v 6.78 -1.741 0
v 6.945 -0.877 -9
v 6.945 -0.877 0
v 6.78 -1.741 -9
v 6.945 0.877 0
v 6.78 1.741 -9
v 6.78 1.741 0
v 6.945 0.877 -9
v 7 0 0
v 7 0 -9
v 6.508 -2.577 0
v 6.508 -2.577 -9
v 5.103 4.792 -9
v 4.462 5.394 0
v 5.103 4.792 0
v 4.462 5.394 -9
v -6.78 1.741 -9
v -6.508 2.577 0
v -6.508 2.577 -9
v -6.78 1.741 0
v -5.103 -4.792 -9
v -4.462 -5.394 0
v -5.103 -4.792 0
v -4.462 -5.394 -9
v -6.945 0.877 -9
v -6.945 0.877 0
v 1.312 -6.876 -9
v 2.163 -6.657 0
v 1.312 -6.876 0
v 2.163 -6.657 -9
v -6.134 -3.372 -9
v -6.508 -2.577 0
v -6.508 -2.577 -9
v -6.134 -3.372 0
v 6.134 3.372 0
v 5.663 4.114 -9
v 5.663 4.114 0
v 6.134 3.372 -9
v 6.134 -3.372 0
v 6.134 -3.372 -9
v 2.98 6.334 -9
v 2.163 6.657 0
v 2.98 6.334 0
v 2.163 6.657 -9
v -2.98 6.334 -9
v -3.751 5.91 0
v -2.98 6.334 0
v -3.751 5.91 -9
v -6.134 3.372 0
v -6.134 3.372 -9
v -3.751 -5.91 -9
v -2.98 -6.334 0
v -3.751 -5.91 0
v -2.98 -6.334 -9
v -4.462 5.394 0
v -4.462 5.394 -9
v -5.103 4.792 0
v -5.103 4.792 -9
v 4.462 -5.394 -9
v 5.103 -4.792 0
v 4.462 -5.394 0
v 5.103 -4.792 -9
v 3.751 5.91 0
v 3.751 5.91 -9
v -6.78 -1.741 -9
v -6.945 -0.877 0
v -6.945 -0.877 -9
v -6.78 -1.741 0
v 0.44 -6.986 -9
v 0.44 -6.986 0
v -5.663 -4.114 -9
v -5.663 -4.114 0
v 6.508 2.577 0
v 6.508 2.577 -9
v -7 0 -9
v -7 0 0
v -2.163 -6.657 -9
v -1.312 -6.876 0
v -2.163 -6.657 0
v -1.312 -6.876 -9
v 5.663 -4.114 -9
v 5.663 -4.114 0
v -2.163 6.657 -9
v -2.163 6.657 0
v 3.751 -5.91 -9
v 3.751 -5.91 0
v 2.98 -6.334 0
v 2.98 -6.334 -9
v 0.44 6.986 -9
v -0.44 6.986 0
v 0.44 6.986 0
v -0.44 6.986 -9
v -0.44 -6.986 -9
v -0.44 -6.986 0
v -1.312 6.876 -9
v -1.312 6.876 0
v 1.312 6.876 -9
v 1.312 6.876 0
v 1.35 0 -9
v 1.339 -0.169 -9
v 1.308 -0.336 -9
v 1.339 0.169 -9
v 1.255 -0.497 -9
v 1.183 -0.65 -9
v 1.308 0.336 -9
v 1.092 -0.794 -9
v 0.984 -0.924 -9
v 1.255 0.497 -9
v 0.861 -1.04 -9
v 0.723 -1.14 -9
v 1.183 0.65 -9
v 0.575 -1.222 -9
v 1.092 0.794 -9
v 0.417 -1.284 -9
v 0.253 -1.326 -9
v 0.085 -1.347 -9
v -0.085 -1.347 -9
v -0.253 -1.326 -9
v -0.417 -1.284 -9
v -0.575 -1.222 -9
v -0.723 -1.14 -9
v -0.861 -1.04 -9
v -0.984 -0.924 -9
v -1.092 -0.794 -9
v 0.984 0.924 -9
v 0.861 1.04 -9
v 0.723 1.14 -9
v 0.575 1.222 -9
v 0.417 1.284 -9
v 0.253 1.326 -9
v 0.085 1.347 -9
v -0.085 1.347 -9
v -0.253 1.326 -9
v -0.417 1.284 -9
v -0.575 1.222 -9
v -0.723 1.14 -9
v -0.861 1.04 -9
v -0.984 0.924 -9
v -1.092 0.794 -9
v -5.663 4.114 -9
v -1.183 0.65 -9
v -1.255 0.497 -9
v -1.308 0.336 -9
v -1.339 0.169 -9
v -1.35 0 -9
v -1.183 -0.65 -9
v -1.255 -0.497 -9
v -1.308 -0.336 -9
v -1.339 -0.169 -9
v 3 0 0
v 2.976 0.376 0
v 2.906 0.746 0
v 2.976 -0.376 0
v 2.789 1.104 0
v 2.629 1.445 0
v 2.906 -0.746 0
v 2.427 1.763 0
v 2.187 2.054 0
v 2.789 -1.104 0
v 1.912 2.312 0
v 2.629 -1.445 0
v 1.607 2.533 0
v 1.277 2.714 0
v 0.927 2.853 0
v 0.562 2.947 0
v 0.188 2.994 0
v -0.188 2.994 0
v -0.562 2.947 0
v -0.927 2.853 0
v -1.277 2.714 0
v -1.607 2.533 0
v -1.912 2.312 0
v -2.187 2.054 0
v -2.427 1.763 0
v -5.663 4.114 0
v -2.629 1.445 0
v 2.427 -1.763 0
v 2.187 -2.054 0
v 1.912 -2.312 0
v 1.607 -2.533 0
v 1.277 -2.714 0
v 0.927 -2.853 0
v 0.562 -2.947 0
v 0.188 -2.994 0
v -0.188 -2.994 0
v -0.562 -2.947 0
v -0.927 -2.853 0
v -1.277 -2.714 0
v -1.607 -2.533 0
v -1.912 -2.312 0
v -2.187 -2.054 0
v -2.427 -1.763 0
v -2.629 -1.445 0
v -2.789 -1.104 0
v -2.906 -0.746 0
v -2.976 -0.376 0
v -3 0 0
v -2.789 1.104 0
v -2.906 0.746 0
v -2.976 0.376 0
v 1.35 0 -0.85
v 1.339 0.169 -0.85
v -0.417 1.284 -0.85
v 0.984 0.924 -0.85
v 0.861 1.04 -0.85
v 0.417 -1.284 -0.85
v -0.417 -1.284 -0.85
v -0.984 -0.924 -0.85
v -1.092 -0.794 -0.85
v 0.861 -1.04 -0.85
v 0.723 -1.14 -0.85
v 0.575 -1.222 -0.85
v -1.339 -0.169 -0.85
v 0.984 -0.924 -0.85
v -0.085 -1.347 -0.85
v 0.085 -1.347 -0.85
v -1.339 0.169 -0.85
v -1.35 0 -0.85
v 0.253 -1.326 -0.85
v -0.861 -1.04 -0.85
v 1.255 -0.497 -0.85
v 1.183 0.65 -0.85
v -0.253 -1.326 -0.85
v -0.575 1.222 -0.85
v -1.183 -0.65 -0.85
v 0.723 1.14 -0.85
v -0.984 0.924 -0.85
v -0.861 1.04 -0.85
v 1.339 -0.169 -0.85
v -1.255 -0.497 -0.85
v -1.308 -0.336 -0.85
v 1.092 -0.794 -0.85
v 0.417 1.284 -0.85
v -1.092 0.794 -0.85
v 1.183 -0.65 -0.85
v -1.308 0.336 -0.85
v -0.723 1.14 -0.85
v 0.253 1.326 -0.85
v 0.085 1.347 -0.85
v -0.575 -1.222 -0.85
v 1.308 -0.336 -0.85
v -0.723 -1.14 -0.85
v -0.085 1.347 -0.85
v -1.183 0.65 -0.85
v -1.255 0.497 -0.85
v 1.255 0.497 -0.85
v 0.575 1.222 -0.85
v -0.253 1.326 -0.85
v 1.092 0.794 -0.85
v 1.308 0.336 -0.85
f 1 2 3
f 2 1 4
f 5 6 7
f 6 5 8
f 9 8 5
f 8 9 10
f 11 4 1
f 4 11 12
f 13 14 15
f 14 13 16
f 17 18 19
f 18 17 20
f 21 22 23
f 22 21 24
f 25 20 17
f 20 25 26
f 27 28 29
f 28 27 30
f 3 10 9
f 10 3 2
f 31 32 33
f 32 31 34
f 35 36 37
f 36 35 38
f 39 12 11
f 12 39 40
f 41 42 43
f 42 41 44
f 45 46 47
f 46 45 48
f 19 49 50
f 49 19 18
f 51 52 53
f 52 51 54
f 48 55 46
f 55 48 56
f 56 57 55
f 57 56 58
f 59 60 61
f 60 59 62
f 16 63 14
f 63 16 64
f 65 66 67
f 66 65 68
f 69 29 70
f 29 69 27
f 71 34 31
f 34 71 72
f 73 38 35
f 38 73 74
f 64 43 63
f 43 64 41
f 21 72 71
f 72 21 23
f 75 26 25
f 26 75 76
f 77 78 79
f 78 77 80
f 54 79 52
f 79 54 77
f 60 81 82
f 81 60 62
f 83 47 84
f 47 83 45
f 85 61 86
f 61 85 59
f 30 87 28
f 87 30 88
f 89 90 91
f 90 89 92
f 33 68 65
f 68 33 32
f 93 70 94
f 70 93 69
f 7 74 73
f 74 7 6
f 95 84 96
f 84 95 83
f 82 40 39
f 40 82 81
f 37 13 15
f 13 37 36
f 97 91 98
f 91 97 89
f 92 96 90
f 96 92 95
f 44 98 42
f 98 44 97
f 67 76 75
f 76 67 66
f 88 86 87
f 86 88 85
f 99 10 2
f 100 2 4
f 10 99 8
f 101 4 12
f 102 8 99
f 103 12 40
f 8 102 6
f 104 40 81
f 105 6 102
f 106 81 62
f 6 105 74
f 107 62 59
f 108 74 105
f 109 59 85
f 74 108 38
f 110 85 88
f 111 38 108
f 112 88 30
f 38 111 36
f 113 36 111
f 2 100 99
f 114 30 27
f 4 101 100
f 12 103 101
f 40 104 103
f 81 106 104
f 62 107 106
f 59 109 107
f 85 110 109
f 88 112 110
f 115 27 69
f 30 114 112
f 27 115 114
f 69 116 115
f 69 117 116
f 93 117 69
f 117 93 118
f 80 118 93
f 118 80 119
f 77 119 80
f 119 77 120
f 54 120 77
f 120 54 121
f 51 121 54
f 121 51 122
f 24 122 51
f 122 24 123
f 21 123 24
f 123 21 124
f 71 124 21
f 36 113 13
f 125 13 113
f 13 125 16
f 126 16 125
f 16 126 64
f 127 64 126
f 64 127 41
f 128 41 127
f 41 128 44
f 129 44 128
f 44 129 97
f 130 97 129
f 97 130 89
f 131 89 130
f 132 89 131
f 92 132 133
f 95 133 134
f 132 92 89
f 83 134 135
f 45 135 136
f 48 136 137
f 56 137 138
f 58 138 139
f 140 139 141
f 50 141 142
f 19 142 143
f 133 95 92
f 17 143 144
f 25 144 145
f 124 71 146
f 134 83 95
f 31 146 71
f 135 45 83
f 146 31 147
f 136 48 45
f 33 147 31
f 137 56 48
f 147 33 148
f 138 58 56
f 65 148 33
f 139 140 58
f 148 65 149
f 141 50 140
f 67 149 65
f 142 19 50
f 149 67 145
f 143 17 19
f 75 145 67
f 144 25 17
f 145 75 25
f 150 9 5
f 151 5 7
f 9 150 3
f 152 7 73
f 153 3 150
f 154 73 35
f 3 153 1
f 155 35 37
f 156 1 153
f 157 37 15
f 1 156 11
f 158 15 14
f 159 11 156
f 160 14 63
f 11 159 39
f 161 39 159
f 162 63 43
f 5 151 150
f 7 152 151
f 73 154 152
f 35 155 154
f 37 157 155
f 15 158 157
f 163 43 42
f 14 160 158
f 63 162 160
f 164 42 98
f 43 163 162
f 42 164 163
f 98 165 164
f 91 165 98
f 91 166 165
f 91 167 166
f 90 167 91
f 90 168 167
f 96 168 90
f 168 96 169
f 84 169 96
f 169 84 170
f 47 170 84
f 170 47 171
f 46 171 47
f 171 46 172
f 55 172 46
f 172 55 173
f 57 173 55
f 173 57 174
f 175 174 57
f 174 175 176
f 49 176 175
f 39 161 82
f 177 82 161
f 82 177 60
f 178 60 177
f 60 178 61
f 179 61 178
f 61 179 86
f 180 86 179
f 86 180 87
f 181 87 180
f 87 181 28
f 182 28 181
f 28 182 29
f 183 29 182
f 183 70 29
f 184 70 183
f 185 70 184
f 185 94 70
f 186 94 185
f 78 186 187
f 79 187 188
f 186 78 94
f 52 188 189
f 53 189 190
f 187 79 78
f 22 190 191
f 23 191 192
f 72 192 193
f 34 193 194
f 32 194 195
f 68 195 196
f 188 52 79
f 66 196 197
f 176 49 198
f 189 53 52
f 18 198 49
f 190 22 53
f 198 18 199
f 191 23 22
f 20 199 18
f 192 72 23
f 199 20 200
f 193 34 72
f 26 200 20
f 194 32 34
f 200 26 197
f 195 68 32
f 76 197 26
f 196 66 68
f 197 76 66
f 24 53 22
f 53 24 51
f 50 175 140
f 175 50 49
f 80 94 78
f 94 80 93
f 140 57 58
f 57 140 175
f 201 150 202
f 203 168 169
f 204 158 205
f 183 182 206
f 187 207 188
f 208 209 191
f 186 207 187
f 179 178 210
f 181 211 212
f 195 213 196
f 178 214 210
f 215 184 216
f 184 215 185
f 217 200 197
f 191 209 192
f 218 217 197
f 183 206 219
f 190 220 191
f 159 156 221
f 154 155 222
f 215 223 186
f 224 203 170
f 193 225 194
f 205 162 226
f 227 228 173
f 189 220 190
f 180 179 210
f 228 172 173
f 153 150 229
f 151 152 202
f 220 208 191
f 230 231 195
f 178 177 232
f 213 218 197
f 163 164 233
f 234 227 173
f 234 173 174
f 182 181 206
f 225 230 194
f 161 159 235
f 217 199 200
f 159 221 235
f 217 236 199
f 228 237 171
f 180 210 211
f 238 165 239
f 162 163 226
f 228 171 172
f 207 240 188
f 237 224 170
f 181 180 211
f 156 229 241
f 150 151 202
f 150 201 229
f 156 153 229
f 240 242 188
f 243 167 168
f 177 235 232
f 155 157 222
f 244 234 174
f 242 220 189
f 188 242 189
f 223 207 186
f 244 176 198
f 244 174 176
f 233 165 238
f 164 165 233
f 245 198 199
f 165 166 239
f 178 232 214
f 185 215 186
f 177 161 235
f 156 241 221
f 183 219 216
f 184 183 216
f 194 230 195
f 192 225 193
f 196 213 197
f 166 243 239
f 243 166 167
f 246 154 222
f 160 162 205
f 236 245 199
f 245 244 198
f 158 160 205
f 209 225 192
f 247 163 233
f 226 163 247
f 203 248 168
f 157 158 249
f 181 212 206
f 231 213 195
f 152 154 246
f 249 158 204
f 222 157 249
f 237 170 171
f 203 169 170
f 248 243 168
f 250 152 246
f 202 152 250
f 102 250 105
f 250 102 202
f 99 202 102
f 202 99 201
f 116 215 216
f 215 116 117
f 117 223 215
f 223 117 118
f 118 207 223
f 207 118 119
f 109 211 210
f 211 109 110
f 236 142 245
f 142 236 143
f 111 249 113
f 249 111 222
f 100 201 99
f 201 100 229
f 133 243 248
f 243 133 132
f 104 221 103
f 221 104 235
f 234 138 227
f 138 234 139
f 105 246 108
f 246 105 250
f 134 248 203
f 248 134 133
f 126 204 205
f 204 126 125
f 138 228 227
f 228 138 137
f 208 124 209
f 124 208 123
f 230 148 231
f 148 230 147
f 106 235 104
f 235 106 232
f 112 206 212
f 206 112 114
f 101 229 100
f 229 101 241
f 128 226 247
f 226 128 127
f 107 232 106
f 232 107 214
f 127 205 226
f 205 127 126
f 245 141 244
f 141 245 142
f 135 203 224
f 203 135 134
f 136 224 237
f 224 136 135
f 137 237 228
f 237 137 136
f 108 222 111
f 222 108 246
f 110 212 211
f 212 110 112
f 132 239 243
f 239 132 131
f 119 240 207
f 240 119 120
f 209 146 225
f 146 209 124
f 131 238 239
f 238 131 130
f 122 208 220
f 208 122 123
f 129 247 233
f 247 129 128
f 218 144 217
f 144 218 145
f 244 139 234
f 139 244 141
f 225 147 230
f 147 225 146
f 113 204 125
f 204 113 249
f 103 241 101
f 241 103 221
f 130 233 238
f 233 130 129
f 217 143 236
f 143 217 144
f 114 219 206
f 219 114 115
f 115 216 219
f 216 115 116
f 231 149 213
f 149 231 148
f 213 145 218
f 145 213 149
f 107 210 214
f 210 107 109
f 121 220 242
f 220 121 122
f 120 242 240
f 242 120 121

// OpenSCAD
$fn = 50;


difference() {
	union() {
		translate(v = [0, 0, -9.0000000000]) {
			cylinder(h = 9, r = 7.0000000000);
		}
		translate(v = [0, 0, -9.0000000000]) {
			cylinder(h = 9, r = 2.8750000000);
		}
	}
	union() {
		translate(v = [0, 0, 0]) {
			rotate(a = [0, 0, 0]) {
				difference() {
					union() {
						translate(v = [0, 0, -9.0000000000]) {
							cylinder(h = 9, r = 1.0000000000);
						}
						translate(v = [0, 0, -0.8500000000]) {
							cylinder(h = 0.8500000000, r1 = 1.3500000000, r2 = 3.0000000000);
						}
						translate(v = [0, 0, -9.0000000000]) {
							cylinder(h = 9, r = 1.3500000000);
						}
						translate(v = [0, 0, -9.0000000000]) {
							cylinder(h = 9, r = 1.0000000000);
						}
					}
					union();
				}
			}
		}
	}
}
